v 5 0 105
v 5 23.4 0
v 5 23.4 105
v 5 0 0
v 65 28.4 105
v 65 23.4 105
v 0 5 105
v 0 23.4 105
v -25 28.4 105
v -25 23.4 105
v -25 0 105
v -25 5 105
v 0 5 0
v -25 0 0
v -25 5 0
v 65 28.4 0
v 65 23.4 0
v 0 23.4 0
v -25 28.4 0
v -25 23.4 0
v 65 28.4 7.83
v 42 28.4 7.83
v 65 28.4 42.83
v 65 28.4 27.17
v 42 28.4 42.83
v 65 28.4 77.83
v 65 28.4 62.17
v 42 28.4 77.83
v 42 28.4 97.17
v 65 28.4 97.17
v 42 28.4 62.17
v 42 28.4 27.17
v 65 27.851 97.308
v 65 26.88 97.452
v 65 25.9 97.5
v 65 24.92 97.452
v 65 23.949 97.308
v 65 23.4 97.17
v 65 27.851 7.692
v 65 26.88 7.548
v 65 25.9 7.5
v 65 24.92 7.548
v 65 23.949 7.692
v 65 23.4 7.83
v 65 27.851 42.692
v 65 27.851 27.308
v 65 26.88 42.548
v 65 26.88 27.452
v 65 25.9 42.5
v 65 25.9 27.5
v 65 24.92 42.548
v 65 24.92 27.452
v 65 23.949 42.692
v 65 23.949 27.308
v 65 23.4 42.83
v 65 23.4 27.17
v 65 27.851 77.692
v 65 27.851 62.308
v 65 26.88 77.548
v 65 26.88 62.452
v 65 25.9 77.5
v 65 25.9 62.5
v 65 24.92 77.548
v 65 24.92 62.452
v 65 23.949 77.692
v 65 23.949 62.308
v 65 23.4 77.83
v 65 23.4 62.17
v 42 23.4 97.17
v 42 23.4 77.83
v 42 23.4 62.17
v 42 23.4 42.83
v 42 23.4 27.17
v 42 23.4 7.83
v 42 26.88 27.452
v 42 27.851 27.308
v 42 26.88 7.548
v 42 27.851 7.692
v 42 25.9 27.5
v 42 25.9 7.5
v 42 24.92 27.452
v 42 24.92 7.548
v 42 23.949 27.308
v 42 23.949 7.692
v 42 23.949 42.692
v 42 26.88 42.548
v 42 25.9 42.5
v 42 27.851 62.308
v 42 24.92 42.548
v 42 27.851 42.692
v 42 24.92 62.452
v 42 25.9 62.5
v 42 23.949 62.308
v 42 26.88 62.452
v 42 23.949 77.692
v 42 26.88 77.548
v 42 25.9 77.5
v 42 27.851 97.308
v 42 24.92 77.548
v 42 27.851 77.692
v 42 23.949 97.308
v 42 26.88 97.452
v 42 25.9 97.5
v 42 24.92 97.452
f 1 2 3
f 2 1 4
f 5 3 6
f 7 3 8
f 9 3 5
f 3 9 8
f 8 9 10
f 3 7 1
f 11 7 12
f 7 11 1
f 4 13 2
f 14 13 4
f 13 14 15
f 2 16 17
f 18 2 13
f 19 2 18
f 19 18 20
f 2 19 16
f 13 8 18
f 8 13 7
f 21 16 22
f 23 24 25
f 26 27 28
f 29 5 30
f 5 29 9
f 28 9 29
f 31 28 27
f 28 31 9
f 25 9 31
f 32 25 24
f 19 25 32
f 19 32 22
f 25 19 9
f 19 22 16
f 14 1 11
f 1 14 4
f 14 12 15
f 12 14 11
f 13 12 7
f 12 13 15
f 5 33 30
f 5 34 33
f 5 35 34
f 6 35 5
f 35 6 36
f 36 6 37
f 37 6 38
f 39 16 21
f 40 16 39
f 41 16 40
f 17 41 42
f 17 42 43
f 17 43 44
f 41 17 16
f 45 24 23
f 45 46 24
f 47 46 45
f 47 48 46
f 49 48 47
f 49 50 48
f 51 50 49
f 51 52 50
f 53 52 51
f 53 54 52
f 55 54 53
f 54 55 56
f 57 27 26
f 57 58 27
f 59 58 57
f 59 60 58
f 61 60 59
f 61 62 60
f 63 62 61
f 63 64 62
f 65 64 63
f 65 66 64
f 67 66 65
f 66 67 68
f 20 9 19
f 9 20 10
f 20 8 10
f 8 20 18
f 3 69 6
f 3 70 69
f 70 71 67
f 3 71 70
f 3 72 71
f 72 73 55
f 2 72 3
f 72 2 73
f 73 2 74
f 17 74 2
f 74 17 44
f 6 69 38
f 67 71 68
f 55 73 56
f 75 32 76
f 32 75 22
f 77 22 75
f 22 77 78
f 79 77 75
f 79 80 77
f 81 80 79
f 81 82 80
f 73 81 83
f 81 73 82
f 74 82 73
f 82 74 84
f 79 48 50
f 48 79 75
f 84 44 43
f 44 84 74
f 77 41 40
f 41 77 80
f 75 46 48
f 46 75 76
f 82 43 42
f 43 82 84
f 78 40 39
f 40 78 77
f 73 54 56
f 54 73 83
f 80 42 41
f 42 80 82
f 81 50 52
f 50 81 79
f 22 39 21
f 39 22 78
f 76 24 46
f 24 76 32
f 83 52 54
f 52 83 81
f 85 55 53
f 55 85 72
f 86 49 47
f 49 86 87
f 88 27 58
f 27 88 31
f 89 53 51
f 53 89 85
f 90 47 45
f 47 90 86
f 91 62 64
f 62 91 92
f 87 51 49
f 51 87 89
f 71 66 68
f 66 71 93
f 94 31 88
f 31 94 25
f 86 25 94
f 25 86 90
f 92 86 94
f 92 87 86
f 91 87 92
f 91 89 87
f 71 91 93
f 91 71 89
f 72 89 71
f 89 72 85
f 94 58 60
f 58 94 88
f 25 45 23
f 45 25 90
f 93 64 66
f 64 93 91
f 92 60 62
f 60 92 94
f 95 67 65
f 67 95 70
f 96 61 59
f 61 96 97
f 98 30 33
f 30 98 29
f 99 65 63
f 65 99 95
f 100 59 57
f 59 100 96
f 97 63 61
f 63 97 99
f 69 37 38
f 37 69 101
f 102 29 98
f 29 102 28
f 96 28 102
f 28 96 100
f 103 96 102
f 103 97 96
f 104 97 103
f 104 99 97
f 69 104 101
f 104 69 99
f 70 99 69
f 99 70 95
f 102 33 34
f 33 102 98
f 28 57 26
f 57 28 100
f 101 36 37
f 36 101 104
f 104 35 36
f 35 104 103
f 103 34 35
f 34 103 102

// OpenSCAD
// Pipette Holder Clamp
// Designed for an 18mm thick shelf.
// Printed lying on its side (Z is the extrusion direction).

// --- Dimensions ---
shelf_thickness = 18.0;
spine_x_end     = 5.0;
spine_y_end     = 28.4;

bottom_jaw_x_start = -25.0;
bottom_jaw_x_end   = 5.0;
bottom_jaw_y_end    = 5.0;

arm_x_start      = -25.0;
arm_x_end        = 65.0;
arm_y_start      = 23.4;
arm_y_end        = 28.4;

extrusion_length = 105.0;

// Hole dimensions
hole_diameter    = 20.0;
hole_z_positions  = [17.5, 52.5, 87.5];
hole_x_pos       = 42.0;
// The hole is centered in the arm's Y-thickness. 
// Arm Y is 23.4 to 28.4 (thickness 5.0). Center is 25.9.
hole_y_center     = (arm_y_start + arm_y_end) / 2; 

$fn = 64;

module main_body() {
    union() {
        // Spine: x=0 to 5, y=0 to 28.4
        cube([spine_x_end, spine_y_end, extrusion_length]);
        
        // Bottom Jaw: x=-25 to 5, y=0 to 5
        translate([bottom_jaw_x_start, 0, 0])
            cube([bottom_jaw_x_end - bottom_jaw_x_start, bottom_jaw_y_end, extrusion_length]);
        
        // Top Jaw and Arm: x=-25 to 65, y=23.4 to 28.4
        translate([arm_x_start, arm_y_start, 0])
            cube([arm_x_end - arm_x_start, arm_y_end - arm_y_start, extrusion_length]);
    }
}

difference() {
    main_body();
    
    // Pipette Holes
    // Holes are through the arm along Y (vertically in use).
    // In print orientation (Z extrusion), the arm is in the XY plane.
    // "Through the arm along Y" means the cylinder axis is the Y axis.
    for (z_pos = hole_z_positions) {
        translate([hole_x_pos, hole_y_center, z_pos])
            rotate([0, 90, 0])
                cylinder(h = 100, d = hole_diameter); // h > 2*arm_thickness to ensure clean cut
    }
}
